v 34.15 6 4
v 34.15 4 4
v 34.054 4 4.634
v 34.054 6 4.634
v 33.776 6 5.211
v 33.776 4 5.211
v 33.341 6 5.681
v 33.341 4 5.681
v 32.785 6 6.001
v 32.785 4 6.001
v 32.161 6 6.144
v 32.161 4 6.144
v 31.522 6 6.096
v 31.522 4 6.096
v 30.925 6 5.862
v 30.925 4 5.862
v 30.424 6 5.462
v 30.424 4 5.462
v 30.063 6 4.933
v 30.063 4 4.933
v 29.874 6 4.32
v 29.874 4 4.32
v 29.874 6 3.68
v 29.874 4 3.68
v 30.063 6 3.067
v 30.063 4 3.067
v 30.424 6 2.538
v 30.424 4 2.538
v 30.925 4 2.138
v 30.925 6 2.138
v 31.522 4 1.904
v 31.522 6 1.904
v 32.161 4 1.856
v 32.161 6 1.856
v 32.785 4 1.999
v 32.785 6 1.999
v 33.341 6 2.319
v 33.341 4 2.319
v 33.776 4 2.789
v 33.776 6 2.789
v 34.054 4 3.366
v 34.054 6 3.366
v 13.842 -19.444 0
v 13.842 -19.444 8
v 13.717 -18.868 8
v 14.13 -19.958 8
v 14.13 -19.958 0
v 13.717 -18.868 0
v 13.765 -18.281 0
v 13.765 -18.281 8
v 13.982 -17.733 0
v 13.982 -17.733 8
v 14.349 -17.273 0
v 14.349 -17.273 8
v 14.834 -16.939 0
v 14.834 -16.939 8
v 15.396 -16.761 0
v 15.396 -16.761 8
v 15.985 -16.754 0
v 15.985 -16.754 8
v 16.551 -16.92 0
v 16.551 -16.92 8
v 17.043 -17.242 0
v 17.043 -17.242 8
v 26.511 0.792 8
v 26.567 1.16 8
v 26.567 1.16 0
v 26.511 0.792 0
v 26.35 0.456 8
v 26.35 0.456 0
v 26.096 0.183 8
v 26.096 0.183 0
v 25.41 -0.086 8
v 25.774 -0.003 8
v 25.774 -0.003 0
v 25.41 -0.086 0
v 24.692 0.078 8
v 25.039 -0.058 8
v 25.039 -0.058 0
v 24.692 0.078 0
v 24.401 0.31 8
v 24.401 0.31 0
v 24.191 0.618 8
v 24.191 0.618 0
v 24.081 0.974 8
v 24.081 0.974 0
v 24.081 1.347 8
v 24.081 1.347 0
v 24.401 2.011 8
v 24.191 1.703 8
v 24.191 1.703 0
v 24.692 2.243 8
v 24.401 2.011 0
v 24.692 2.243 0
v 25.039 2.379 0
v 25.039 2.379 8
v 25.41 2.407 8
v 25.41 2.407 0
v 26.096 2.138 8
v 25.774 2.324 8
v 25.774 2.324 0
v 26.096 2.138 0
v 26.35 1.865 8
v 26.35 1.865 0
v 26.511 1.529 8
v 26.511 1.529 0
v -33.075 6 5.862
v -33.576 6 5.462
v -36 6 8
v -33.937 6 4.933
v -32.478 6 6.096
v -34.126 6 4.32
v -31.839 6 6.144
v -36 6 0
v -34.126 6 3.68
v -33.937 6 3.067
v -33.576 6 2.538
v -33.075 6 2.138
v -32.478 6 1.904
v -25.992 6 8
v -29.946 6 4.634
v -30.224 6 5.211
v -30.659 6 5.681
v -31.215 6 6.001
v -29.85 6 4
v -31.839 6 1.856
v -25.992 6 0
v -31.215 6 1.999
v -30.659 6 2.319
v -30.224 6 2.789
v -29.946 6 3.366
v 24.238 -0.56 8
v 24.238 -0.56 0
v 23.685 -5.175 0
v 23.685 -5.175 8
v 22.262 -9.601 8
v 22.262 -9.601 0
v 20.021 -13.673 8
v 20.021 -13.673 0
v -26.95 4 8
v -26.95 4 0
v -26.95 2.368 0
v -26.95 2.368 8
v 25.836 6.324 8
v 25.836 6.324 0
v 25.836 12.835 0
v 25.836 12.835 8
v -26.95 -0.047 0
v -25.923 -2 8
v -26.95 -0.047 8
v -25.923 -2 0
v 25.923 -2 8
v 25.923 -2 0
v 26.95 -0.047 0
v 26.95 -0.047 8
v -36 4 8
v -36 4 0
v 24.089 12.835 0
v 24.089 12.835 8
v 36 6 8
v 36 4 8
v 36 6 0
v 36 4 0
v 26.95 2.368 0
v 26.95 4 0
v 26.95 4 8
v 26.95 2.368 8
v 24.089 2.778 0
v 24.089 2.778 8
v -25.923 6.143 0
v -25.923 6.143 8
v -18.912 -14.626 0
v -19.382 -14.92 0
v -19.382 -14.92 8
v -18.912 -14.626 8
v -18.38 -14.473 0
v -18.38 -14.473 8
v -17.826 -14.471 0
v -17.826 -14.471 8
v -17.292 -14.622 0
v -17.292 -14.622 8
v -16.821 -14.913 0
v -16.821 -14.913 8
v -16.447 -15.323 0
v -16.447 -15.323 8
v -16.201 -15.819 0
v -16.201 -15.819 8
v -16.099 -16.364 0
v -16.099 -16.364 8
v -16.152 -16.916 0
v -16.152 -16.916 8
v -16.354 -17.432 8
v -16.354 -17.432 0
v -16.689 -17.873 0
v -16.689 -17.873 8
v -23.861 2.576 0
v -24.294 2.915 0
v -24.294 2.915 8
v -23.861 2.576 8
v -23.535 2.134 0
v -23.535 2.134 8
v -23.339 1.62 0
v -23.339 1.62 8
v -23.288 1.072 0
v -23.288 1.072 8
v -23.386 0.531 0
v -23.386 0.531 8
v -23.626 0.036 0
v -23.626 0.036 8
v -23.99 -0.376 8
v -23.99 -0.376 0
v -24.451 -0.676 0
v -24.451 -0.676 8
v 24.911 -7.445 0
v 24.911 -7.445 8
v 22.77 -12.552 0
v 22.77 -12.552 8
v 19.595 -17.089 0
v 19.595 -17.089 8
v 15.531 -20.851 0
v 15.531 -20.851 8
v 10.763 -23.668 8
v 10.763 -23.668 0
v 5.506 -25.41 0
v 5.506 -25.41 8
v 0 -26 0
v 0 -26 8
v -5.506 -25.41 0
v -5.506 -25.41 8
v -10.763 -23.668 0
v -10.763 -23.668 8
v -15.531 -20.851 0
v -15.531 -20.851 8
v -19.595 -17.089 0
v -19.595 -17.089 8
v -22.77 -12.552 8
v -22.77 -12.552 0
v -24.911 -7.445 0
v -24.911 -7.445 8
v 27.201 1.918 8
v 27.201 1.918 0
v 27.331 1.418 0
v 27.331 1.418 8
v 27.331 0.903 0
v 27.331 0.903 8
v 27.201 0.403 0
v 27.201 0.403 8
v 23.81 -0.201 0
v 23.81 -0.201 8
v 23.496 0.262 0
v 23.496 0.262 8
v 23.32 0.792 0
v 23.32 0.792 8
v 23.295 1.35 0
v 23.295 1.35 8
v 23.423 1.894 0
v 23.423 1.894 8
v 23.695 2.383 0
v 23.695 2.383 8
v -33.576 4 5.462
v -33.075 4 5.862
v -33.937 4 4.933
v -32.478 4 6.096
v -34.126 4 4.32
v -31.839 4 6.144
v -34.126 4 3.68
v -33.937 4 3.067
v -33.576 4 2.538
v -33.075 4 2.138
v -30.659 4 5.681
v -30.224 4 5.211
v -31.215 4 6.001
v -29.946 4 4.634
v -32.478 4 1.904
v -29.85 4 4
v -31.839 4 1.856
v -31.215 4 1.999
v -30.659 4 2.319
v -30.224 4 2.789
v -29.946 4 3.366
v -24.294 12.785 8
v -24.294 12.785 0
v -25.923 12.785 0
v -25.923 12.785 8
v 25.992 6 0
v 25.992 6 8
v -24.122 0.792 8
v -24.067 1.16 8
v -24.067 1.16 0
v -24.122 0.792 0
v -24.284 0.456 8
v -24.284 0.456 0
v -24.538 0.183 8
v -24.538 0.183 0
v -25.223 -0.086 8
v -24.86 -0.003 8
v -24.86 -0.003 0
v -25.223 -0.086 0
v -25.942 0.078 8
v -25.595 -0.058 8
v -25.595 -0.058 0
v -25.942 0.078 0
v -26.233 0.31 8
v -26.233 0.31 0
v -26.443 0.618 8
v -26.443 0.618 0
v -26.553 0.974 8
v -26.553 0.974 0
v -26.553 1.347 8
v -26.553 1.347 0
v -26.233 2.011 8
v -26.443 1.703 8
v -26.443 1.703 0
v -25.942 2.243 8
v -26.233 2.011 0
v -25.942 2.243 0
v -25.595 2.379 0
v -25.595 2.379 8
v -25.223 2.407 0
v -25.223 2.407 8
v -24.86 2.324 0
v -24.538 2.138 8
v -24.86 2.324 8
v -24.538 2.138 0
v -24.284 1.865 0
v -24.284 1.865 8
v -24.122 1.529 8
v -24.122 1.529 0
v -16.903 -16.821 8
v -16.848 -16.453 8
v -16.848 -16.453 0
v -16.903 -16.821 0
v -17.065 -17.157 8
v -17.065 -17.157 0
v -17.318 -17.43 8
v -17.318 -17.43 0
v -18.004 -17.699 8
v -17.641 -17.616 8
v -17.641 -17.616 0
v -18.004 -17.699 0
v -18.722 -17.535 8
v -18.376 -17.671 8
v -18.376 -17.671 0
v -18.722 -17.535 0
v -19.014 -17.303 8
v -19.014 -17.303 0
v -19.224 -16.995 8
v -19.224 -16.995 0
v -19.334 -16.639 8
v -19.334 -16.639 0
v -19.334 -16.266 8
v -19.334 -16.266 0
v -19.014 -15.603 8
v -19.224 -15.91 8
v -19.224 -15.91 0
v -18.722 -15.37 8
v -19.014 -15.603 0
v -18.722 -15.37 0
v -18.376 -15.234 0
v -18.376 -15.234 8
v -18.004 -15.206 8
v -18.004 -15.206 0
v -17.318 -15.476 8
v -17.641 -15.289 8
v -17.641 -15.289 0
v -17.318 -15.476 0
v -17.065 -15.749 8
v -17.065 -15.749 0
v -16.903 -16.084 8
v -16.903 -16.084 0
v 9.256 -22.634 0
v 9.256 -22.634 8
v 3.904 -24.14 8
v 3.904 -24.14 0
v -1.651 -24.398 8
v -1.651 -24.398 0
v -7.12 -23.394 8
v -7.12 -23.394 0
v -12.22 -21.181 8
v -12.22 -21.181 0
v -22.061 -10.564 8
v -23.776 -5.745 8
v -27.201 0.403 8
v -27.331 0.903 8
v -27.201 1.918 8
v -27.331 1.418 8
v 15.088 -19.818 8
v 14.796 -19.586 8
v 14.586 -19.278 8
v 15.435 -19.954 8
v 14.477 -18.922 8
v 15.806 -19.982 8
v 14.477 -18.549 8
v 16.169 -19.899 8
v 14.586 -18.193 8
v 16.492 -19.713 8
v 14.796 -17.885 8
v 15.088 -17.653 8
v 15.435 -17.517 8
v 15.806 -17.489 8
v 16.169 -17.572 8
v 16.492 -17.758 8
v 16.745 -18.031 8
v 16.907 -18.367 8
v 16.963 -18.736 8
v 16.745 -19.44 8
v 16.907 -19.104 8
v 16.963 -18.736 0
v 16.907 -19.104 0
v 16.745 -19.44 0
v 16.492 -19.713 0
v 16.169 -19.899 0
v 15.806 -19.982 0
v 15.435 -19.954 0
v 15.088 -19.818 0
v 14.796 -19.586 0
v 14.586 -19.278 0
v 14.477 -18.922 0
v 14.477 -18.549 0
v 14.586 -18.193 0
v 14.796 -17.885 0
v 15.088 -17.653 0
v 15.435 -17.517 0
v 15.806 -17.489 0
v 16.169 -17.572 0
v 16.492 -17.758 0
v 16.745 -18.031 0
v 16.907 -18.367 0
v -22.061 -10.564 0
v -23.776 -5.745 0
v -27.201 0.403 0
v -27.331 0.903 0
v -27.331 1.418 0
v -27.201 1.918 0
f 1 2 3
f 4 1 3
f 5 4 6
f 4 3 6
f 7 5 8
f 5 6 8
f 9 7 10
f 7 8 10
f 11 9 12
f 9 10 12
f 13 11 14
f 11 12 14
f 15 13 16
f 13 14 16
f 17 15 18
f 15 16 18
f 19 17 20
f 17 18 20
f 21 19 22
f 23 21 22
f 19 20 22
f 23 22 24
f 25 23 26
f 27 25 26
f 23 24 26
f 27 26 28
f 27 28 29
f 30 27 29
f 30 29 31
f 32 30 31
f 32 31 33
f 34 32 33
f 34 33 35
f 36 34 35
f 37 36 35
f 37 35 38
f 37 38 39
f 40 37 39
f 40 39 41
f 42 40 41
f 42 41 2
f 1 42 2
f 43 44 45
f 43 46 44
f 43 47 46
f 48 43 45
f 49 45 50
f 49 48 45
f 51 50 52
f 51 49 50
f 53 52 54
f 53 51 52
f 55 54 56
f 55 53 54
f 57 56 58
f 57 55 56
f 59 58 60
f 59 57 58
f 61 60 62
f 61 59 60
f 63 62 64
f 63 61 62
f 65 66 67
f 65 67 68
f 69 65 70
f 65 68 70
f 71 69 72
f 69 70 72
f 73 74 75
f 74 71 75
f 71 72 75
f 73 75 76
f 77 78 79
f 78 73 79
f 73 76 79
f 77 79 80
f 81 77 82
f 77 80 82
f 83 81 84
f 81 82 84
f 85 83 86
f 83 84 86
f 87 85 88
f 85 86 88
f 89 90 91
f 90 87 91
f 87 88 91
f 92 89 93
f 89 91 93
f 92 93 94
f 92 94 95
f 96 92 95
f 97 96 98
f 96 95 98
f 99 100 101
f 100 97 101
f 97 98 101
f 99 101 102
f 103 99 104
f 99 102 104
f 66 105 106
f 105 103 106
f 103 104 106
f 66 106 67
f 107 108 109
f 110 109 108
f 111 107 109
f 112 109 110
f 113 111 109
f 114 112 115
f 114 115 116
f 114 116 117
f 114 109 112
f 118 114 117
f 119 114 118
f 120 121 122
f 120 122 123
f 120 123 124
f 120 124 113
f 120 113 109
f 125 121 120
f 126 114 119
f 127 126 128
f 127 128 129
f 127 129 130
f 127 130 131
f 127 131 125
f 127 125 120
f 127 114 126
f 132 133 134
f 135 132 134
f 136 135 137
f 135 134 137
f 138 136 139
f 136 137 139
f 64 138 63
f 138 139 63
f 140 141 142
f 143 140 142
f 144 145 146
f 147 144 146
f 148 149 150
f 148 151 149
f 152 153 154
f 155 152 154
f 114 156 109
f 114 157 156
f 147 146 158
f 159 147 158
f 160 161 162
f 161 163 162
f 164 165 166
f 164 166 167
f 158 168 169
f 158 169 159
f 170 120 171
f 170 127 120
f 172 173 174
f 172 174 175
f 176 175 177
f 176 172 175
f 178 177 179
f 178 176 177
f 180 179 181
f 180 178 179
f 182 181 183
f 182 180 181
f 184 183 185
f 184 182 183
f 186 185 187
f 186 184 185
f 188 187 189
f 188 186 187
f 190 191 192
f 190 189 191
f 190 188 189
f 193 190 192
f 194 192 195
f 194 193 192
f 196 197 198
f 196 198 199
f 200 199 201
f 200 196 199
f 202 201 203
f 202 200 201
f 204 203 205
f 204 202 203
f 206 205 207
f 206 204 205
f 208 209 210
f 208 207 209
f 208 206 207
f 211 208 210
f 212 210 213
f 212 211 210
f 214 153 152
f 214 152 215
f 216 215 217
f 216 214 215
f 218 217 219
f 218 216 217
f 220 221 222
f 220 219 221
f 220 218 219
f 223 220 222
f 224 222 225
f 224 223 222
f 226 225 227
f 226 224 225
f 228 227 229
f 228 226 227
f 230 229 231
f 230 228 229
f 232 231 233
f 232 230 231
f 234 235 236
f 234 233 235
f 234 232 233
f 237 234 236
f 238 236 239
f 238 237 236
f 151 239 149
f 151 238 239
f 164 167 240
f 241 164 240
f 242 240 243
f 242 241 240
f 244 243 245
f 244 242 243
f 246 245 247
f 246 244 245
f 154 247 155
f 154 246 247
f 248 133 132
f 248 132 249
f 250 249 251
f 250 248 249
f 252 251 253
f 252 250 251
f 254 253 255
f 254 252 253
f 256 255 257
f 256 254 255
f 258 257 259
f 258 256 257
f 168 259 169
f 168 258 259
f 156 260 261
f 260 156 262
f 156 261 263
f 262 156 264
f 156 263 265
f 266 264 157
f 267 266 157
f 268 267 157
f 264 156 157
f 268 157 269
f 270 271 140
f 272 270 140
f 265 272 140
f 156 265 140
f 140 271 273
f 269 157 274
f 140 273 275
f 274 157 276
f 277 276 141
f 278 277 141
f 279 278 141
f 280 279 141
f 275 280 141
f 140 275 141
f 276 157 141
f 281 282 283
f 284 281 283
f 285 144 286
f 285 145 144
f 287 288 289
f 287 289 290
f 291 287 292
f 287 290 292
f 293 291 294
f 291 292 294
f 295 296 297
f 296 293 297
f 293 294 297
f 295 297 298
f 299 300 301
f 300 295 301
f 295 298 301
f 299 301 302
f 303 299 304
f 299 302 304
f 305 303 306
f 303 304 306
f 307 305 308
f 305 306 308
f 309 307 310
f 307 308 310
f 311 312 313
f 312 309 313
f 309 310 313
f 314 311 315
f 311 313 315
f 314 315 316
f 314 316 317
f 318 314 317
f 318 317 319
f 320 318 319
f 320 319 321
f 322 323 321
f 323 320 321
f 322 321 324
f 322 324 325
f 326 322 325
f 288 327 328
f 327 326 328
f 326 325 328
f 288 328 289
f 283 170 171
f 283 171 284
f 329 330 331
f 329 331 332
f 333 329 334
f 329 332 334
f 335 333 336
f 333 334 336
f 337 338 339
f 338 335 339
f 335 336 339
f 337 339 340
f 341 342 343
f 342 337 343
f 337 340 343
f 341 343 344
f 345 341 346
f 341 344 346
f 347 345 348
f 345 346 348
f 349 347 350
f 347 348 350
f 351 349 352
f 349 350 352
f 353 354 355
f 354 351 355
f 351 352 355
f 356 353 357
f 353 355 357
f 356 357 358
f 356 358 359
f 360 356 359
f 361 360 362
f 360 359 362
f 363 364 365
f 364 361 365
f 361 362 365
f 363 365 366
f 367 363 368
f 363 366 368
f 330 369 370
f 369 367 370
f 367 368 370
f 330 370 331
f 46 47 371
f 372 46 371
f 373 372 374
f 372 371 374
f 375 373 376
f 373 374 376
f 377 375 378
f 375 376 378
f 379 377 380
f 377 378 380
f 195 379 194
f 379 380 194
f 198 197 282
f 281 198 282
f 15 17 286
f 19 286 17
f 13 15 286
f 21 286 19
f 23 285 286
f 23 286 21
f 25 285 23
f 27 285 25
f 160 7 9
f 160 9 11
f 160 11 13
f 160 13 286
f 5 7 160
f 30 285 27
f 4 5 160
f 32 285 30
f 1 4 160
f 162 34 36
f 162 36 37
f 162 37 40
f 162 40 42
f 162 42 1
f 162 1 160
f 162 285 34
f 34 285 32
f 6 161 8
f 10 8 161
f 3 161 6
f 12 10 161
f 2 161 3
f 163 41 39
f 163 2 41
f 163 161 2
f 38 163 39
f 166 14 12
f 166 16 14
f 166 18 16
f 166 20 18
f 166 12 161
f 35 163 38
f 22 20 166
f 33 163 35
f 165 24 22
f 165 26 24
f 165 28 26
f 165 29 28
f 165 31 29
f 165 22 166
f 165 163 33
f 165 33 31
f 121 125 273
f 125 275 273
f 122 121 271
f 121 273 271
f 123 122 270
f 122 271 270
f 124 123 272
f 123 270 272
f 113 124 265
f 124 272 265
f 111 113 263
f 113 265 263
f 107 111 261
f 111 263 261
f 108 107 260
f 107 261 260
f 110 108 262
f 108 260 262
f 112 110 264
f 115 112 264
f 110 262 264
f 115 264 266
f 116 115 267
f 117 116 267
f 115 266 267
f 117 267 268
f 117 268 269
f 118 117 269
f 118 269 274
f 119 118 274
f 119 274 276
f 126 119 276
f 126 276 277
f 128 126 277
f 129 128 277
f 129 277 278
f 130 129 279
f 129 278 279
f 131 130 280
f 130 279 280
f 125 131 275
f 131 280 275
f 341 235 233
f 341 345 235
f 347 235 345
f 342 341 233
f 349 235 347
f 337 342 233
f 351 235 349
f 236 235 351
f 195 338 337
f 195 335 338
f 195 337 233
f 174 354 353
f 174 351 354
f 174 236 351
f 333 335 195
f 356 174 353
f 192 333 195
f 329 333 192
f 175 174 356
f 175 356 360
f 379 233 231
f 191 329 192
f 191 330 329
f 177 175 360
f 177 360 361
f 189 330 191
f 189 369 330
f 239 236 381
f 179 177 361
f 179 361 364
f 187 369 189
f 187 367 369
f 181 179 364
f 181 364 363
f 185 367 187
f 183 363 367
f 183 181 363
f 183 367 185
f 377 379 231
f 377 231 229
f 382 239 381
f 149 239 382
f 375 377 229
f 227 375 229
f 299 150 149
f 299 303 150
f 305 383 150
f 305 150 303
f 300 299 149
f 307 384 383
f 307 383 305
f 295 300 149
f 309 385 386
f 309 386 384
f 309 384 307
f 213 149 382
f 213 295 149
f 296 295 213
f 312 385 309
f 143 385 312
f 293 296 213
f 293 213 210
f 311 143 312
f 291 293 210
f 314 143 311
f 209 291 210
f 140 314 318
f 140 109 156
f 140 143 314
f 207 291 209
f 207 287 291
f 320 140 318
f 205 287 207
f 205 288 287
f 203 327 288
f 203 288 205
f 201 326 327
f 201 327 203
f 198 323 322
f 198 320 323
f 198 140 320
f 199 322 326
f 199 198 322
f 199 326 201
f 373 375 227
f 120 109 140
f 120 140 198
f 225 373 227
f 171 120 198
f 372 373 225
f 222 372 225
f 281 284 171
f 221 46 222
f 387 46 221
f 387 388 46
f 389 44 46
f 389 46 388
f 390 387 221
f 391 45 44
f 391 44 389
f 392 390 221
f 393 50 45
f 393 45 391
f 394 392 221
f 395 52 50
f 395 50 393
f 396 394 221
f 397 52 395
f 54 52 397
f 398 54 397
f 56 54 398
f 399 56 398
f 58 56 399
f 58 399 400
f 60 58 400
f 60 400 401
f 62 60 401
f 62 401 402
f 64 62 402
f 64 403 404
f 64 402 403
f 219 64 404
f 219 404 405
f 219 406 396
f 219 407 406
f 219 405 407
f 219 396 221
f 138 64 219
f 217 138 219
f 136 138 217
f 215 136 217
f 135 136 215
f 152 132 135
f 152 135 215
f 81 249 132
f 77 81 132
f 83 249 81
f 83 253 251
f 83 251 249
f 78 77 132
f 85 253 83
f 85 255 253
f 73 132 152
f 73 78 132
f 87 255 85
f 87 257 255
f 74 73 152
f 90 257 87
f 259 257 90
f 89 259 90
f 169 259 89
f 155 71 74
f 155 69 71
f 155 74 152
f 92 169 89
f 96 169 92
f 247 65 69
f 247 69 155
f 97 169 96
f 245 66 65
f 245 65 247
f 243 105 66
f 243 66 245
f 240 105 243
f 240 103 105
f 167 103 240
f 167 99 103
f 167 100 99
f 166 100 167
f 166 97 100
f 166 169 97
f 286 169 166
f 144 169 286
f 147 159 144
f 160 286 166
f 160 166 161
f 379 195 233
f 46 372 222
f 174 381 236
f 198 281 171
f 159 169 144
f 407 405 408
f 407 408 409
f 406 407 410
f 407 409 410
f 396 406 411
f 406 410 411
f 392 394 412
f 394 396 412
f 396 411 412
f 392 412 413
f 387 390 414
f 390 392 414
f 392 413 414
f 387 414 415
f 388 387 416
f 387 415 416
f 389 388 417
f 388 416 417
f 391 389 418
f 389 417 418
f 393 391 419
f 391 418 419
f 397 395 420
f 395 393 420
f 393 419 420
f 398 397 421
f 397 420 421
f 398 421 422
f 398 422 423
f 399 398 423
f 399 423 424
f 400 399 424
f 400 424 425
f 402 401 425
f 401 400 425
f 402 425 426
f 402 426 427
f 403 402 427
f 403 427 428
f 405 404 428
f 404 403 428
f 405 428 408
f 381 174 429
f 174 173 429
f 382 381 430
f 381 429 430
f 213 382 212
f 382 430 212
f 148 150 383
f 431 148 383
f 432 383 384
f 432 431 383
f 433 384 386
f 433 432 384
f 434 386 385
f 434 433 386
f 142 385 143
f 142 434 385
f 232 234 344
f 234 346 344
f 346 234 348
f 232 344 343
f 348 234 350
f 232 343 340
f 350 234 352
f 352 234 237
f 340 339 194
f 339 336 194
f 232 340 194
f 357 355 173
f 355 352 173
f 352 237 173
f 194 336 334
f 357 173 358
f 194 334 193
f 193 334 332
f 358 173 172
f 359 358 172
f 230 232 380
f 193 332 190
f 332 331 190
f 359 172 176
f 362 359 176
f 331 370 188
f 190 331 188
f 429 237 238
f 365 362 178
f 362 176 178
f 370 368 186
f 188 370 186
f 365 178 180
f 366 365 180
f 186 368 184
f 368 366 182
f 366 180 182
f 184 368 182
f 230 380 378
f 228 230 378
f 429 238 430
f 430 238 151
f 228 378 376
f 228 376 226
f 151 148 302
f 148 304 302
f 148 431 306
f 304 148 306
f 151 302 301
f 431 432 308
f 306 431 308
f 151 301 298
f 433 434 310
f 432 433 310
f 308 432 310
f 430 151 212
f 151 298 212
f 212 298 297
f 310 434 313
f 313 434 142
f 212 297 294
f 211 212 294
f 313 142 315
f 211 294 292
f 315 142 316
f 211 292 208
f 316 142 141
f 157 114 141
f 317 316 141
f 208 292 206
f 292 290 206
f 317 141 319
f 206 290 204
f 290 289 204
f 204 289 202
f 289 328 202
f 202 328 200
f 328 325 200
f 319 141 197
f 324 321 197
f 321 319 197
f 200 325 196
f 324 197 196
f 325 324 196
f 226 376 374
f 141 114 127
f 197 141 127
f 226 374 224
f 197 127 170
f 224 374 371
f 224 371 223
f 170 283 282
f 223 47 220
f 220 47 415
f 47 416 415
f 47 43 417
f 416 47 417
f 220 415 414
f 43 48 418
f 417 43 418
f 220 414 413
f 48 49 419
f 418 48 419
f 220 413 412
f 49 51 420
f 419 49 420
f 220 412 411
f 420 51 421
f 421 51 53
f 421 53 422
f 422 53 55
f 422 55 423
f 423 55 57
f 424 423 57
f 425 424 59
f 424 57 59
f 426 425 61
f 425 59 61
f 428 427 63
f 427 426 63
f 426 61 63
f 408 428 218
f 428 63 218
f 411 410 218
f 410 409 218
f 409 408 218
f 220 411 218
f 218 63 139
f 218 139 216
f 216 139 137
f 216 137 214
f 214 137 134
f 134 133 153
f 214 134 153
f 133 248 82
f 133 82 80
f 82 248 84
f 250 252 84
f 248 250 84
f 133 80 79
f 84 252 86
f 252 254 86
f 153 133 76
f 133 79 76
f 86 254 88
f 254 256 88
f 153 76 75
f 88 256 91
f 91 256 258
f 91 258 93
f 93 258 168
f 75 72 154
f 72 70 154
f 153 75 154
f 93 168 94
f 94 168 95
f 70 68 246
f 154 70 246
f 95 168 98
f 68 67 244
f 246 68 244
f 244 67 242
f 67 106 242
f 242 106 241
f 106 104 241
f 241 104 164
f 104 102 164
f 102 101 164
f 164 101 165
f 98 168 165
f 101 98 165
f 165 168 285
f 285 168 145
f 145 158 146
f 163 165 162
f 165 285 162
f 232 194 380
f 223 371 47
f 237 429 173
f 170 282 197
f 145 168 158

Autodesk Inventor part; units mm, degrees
ref_plane "YZ Plane" through (0, 0, 0) normal (1, 0, 0) x (0, 1, 0)
ref_plane "XZ Plane" through (0, 0, 0) normal (0, 1, 0) x (-1, 0, 0)
ref_plane "XY Plane" through (0, 0, 0) normal (0, 0, 1) x (1, 0, 0)
sketch "Esquisse1" plane through (0, 0, 0) normal (0, 0, 1) x (1, 0, 0)
  line L0 (0, 0) -> (-27.546, -25.0426) construction
  line L1 (0, 0) -> (23.0277, -27.4577) construction
  circle A0 centre (-18.0975, -16.4528) radius 1.25
  circle A1 centre (15.7127, -18.7355) radius 1.25
  arc A2 (-16.6894, -17.8731) -> (14.1299, -19.9581) centre (0, 0) ccw
  arc A3 (-16.6894, -17.8731) -> (-19.3824, -14.9201) centre (-18.0975, -16.4528) ccw
  arc A4 (17.0433, -17.2424) -> (14.1299, -19.9581) centre (15.7127, -18.7355) ccw
  line L2 (0, 0) -> (-29.5508, 10.7556) construction
  line L3 (-17.8311, 0) -> (17.1748, 0) construction
  line L4 (0, 2.0526) -> (0, -2.2236) construction
  arc A5 (-25.923, -2) -> (25.923, -2) centre (0, 0) ccw
  circle A6 centre (0, 0) radius 22.5 construction
  arc A7 (-16.6894, -17.8731) -> (14.1299, -19.9581) centre (0, 0) ccw
  arc A8 (-16.6894, -17.8731) -> (14.1299, -19.9581) centre (0, 0) ccw
  circle A9 centre (-25.3169, 1.1605) radius 1.25
  circle A10 centre (25.3169, 1.1605) radius 1.25
  line L5 (24.0891, 2.7784) -> (24.0891, 12.8348)
  line L6 (25.8363, 12.8348) -> (24.0891, 12.8348)
  line L7 (-25.923, 6.143) -> (-25.923, 12.7847)
  line L8 (-24.2942, 2.9148) -> (-24.2942, 12.7847)
  line L9 (-24.2942, 12.7847) -> (-25.923, 12.7847)
  arc A11 (-24.4506, -0.676) -> (-19.3824, -14.9201) centre (0, 0) ccw
  arc A12 (-24.4506, -0.676) -> (-19.3824, -14.9201) centre (0, 0) ccw
  arc A13 (-24.4506, -0.676) -> (-24.2942, 2.9148) centre (-25.3169, 1.1605) ccw
  arc A14 (17.0433, -17.2424) -> (24.2376, -0.5599) centre (0, 0) ccw
  arc A15 (17.0433, -17.2424) -> (24.2376, -0.5599) centre (0, 0) ccw
  arc A16 (17.0433, -17.2424) -> (24.2376, -0.5599) centre (0, 0) ccw
  arc A17 (24.0891, 2.7784) -> (24.2376, -0.5599) centre (25.3169, 1.1605) ccw
  line L10 (25.8363, 3.0919) -> (25.8363, 3.124)
  line L11 (25.8363, 6.3239) -> (25.8363, 12.8348)
  line L12 (25.8363, 6.3239) -> (25.9915, 6)
  line L13 (-36, 4) -> (-26.9495, 4)
  line L14 (-36, 6) -> (-26, 6)
  line L15 (-36, 4) -> (-36, 6)
  line L16 (-26, 6) -> (-25.9915, 6)
  line L17 (-25.9915, 6) -> (-25.923, 6.143)
  line L18 (-26.9495, 4) -> (-26.9495, 2.3678)
  line L19 (-25.923, -2) -> (-26.9495, -0.0468)
  arc A18 (-26.9495, 2.3678) -> (-26.9495, -0.0468) centre (-25.3169, 1.1605) ccw
  arc A19 (-24.4506, -0.676) -> (-24.2942, 2.9148) centre (-25.3169, 1.1605) ccw
  line L20 (25.9915, 6) -> (25.923, 6.143)
  line L21 (36, 4) -> (26.9495, 4)
  line L22 (36, 6) -> (26, 6)
  line L23 (36, 4) -> (36, 6)
  line L24 (26.9495, 4) -> (26.9495, 2.3678)
  line L25 (25.923, -2) -> (26.9495, -0.0468)
  arc A20 (26.9495, -0.0468) -> (26.9495, 2.3678) centre (25.3169, 1.1605) ccw
  line L26 (25.9915, 6) -> (26, 6)
  point P0 (29.8237, -2)
  point P1 (-36, -2)
  point P2 (-26.3114, 9.5766)
  dimension "d35" = 2.5
  dimension "d36" = 2.5
  dimension "d37" = 4
  dimension "d38" = 4
  dimension "d39" = 20
  dimension "d52" = 45
  dimension "d65" = 2.5
  dimension "d81" = 10
ref_plane "Plan de construction1" through (-42, 0, 0) normal (0, 1, 0) x (1, 0, 0)
ref_plane "Plan de construction2" through (-36, 0, 0) normal (0, 1, 0) x (1, 0, 0)
sketch "Esquisse3" plane through (-36, 0, 0) normal (0, 1, 0) x (1, 0, 0)
  line L0 (0, 0) -> (10, 0) projected
  line L1 (0, 0) -> (0, -8) projected
  line L2 (10, -8) -> (0, -8) projected
  line L3 (10, 0) -> (10, -8) projected
  circle A0 centre (4, -4) radius 2.15
  line L4 (62, 0) -> (72, 0) projected
  line L5 (62, 0) -> (62, -8) projected
  line L6 (72, -8) -> (62, -8) projected
  line L7 (72, 0) -> (72, -8) projected
  circle A1 centre (68, -4) radius 2.15
  point P0 (36, 0)
  dimension "d48" = 4.3
  dimension "d73" = 4
  dimension "d74" = 4.3
  dimension "d75" = 4
extrude "Extrusion16" add sketch "Esquisse1" along normal blind 8
extrude "Extrusion17" cut sketch "Esquisse3" along normal blind 8 contours A0 | A1
properties part number "anneau2"
